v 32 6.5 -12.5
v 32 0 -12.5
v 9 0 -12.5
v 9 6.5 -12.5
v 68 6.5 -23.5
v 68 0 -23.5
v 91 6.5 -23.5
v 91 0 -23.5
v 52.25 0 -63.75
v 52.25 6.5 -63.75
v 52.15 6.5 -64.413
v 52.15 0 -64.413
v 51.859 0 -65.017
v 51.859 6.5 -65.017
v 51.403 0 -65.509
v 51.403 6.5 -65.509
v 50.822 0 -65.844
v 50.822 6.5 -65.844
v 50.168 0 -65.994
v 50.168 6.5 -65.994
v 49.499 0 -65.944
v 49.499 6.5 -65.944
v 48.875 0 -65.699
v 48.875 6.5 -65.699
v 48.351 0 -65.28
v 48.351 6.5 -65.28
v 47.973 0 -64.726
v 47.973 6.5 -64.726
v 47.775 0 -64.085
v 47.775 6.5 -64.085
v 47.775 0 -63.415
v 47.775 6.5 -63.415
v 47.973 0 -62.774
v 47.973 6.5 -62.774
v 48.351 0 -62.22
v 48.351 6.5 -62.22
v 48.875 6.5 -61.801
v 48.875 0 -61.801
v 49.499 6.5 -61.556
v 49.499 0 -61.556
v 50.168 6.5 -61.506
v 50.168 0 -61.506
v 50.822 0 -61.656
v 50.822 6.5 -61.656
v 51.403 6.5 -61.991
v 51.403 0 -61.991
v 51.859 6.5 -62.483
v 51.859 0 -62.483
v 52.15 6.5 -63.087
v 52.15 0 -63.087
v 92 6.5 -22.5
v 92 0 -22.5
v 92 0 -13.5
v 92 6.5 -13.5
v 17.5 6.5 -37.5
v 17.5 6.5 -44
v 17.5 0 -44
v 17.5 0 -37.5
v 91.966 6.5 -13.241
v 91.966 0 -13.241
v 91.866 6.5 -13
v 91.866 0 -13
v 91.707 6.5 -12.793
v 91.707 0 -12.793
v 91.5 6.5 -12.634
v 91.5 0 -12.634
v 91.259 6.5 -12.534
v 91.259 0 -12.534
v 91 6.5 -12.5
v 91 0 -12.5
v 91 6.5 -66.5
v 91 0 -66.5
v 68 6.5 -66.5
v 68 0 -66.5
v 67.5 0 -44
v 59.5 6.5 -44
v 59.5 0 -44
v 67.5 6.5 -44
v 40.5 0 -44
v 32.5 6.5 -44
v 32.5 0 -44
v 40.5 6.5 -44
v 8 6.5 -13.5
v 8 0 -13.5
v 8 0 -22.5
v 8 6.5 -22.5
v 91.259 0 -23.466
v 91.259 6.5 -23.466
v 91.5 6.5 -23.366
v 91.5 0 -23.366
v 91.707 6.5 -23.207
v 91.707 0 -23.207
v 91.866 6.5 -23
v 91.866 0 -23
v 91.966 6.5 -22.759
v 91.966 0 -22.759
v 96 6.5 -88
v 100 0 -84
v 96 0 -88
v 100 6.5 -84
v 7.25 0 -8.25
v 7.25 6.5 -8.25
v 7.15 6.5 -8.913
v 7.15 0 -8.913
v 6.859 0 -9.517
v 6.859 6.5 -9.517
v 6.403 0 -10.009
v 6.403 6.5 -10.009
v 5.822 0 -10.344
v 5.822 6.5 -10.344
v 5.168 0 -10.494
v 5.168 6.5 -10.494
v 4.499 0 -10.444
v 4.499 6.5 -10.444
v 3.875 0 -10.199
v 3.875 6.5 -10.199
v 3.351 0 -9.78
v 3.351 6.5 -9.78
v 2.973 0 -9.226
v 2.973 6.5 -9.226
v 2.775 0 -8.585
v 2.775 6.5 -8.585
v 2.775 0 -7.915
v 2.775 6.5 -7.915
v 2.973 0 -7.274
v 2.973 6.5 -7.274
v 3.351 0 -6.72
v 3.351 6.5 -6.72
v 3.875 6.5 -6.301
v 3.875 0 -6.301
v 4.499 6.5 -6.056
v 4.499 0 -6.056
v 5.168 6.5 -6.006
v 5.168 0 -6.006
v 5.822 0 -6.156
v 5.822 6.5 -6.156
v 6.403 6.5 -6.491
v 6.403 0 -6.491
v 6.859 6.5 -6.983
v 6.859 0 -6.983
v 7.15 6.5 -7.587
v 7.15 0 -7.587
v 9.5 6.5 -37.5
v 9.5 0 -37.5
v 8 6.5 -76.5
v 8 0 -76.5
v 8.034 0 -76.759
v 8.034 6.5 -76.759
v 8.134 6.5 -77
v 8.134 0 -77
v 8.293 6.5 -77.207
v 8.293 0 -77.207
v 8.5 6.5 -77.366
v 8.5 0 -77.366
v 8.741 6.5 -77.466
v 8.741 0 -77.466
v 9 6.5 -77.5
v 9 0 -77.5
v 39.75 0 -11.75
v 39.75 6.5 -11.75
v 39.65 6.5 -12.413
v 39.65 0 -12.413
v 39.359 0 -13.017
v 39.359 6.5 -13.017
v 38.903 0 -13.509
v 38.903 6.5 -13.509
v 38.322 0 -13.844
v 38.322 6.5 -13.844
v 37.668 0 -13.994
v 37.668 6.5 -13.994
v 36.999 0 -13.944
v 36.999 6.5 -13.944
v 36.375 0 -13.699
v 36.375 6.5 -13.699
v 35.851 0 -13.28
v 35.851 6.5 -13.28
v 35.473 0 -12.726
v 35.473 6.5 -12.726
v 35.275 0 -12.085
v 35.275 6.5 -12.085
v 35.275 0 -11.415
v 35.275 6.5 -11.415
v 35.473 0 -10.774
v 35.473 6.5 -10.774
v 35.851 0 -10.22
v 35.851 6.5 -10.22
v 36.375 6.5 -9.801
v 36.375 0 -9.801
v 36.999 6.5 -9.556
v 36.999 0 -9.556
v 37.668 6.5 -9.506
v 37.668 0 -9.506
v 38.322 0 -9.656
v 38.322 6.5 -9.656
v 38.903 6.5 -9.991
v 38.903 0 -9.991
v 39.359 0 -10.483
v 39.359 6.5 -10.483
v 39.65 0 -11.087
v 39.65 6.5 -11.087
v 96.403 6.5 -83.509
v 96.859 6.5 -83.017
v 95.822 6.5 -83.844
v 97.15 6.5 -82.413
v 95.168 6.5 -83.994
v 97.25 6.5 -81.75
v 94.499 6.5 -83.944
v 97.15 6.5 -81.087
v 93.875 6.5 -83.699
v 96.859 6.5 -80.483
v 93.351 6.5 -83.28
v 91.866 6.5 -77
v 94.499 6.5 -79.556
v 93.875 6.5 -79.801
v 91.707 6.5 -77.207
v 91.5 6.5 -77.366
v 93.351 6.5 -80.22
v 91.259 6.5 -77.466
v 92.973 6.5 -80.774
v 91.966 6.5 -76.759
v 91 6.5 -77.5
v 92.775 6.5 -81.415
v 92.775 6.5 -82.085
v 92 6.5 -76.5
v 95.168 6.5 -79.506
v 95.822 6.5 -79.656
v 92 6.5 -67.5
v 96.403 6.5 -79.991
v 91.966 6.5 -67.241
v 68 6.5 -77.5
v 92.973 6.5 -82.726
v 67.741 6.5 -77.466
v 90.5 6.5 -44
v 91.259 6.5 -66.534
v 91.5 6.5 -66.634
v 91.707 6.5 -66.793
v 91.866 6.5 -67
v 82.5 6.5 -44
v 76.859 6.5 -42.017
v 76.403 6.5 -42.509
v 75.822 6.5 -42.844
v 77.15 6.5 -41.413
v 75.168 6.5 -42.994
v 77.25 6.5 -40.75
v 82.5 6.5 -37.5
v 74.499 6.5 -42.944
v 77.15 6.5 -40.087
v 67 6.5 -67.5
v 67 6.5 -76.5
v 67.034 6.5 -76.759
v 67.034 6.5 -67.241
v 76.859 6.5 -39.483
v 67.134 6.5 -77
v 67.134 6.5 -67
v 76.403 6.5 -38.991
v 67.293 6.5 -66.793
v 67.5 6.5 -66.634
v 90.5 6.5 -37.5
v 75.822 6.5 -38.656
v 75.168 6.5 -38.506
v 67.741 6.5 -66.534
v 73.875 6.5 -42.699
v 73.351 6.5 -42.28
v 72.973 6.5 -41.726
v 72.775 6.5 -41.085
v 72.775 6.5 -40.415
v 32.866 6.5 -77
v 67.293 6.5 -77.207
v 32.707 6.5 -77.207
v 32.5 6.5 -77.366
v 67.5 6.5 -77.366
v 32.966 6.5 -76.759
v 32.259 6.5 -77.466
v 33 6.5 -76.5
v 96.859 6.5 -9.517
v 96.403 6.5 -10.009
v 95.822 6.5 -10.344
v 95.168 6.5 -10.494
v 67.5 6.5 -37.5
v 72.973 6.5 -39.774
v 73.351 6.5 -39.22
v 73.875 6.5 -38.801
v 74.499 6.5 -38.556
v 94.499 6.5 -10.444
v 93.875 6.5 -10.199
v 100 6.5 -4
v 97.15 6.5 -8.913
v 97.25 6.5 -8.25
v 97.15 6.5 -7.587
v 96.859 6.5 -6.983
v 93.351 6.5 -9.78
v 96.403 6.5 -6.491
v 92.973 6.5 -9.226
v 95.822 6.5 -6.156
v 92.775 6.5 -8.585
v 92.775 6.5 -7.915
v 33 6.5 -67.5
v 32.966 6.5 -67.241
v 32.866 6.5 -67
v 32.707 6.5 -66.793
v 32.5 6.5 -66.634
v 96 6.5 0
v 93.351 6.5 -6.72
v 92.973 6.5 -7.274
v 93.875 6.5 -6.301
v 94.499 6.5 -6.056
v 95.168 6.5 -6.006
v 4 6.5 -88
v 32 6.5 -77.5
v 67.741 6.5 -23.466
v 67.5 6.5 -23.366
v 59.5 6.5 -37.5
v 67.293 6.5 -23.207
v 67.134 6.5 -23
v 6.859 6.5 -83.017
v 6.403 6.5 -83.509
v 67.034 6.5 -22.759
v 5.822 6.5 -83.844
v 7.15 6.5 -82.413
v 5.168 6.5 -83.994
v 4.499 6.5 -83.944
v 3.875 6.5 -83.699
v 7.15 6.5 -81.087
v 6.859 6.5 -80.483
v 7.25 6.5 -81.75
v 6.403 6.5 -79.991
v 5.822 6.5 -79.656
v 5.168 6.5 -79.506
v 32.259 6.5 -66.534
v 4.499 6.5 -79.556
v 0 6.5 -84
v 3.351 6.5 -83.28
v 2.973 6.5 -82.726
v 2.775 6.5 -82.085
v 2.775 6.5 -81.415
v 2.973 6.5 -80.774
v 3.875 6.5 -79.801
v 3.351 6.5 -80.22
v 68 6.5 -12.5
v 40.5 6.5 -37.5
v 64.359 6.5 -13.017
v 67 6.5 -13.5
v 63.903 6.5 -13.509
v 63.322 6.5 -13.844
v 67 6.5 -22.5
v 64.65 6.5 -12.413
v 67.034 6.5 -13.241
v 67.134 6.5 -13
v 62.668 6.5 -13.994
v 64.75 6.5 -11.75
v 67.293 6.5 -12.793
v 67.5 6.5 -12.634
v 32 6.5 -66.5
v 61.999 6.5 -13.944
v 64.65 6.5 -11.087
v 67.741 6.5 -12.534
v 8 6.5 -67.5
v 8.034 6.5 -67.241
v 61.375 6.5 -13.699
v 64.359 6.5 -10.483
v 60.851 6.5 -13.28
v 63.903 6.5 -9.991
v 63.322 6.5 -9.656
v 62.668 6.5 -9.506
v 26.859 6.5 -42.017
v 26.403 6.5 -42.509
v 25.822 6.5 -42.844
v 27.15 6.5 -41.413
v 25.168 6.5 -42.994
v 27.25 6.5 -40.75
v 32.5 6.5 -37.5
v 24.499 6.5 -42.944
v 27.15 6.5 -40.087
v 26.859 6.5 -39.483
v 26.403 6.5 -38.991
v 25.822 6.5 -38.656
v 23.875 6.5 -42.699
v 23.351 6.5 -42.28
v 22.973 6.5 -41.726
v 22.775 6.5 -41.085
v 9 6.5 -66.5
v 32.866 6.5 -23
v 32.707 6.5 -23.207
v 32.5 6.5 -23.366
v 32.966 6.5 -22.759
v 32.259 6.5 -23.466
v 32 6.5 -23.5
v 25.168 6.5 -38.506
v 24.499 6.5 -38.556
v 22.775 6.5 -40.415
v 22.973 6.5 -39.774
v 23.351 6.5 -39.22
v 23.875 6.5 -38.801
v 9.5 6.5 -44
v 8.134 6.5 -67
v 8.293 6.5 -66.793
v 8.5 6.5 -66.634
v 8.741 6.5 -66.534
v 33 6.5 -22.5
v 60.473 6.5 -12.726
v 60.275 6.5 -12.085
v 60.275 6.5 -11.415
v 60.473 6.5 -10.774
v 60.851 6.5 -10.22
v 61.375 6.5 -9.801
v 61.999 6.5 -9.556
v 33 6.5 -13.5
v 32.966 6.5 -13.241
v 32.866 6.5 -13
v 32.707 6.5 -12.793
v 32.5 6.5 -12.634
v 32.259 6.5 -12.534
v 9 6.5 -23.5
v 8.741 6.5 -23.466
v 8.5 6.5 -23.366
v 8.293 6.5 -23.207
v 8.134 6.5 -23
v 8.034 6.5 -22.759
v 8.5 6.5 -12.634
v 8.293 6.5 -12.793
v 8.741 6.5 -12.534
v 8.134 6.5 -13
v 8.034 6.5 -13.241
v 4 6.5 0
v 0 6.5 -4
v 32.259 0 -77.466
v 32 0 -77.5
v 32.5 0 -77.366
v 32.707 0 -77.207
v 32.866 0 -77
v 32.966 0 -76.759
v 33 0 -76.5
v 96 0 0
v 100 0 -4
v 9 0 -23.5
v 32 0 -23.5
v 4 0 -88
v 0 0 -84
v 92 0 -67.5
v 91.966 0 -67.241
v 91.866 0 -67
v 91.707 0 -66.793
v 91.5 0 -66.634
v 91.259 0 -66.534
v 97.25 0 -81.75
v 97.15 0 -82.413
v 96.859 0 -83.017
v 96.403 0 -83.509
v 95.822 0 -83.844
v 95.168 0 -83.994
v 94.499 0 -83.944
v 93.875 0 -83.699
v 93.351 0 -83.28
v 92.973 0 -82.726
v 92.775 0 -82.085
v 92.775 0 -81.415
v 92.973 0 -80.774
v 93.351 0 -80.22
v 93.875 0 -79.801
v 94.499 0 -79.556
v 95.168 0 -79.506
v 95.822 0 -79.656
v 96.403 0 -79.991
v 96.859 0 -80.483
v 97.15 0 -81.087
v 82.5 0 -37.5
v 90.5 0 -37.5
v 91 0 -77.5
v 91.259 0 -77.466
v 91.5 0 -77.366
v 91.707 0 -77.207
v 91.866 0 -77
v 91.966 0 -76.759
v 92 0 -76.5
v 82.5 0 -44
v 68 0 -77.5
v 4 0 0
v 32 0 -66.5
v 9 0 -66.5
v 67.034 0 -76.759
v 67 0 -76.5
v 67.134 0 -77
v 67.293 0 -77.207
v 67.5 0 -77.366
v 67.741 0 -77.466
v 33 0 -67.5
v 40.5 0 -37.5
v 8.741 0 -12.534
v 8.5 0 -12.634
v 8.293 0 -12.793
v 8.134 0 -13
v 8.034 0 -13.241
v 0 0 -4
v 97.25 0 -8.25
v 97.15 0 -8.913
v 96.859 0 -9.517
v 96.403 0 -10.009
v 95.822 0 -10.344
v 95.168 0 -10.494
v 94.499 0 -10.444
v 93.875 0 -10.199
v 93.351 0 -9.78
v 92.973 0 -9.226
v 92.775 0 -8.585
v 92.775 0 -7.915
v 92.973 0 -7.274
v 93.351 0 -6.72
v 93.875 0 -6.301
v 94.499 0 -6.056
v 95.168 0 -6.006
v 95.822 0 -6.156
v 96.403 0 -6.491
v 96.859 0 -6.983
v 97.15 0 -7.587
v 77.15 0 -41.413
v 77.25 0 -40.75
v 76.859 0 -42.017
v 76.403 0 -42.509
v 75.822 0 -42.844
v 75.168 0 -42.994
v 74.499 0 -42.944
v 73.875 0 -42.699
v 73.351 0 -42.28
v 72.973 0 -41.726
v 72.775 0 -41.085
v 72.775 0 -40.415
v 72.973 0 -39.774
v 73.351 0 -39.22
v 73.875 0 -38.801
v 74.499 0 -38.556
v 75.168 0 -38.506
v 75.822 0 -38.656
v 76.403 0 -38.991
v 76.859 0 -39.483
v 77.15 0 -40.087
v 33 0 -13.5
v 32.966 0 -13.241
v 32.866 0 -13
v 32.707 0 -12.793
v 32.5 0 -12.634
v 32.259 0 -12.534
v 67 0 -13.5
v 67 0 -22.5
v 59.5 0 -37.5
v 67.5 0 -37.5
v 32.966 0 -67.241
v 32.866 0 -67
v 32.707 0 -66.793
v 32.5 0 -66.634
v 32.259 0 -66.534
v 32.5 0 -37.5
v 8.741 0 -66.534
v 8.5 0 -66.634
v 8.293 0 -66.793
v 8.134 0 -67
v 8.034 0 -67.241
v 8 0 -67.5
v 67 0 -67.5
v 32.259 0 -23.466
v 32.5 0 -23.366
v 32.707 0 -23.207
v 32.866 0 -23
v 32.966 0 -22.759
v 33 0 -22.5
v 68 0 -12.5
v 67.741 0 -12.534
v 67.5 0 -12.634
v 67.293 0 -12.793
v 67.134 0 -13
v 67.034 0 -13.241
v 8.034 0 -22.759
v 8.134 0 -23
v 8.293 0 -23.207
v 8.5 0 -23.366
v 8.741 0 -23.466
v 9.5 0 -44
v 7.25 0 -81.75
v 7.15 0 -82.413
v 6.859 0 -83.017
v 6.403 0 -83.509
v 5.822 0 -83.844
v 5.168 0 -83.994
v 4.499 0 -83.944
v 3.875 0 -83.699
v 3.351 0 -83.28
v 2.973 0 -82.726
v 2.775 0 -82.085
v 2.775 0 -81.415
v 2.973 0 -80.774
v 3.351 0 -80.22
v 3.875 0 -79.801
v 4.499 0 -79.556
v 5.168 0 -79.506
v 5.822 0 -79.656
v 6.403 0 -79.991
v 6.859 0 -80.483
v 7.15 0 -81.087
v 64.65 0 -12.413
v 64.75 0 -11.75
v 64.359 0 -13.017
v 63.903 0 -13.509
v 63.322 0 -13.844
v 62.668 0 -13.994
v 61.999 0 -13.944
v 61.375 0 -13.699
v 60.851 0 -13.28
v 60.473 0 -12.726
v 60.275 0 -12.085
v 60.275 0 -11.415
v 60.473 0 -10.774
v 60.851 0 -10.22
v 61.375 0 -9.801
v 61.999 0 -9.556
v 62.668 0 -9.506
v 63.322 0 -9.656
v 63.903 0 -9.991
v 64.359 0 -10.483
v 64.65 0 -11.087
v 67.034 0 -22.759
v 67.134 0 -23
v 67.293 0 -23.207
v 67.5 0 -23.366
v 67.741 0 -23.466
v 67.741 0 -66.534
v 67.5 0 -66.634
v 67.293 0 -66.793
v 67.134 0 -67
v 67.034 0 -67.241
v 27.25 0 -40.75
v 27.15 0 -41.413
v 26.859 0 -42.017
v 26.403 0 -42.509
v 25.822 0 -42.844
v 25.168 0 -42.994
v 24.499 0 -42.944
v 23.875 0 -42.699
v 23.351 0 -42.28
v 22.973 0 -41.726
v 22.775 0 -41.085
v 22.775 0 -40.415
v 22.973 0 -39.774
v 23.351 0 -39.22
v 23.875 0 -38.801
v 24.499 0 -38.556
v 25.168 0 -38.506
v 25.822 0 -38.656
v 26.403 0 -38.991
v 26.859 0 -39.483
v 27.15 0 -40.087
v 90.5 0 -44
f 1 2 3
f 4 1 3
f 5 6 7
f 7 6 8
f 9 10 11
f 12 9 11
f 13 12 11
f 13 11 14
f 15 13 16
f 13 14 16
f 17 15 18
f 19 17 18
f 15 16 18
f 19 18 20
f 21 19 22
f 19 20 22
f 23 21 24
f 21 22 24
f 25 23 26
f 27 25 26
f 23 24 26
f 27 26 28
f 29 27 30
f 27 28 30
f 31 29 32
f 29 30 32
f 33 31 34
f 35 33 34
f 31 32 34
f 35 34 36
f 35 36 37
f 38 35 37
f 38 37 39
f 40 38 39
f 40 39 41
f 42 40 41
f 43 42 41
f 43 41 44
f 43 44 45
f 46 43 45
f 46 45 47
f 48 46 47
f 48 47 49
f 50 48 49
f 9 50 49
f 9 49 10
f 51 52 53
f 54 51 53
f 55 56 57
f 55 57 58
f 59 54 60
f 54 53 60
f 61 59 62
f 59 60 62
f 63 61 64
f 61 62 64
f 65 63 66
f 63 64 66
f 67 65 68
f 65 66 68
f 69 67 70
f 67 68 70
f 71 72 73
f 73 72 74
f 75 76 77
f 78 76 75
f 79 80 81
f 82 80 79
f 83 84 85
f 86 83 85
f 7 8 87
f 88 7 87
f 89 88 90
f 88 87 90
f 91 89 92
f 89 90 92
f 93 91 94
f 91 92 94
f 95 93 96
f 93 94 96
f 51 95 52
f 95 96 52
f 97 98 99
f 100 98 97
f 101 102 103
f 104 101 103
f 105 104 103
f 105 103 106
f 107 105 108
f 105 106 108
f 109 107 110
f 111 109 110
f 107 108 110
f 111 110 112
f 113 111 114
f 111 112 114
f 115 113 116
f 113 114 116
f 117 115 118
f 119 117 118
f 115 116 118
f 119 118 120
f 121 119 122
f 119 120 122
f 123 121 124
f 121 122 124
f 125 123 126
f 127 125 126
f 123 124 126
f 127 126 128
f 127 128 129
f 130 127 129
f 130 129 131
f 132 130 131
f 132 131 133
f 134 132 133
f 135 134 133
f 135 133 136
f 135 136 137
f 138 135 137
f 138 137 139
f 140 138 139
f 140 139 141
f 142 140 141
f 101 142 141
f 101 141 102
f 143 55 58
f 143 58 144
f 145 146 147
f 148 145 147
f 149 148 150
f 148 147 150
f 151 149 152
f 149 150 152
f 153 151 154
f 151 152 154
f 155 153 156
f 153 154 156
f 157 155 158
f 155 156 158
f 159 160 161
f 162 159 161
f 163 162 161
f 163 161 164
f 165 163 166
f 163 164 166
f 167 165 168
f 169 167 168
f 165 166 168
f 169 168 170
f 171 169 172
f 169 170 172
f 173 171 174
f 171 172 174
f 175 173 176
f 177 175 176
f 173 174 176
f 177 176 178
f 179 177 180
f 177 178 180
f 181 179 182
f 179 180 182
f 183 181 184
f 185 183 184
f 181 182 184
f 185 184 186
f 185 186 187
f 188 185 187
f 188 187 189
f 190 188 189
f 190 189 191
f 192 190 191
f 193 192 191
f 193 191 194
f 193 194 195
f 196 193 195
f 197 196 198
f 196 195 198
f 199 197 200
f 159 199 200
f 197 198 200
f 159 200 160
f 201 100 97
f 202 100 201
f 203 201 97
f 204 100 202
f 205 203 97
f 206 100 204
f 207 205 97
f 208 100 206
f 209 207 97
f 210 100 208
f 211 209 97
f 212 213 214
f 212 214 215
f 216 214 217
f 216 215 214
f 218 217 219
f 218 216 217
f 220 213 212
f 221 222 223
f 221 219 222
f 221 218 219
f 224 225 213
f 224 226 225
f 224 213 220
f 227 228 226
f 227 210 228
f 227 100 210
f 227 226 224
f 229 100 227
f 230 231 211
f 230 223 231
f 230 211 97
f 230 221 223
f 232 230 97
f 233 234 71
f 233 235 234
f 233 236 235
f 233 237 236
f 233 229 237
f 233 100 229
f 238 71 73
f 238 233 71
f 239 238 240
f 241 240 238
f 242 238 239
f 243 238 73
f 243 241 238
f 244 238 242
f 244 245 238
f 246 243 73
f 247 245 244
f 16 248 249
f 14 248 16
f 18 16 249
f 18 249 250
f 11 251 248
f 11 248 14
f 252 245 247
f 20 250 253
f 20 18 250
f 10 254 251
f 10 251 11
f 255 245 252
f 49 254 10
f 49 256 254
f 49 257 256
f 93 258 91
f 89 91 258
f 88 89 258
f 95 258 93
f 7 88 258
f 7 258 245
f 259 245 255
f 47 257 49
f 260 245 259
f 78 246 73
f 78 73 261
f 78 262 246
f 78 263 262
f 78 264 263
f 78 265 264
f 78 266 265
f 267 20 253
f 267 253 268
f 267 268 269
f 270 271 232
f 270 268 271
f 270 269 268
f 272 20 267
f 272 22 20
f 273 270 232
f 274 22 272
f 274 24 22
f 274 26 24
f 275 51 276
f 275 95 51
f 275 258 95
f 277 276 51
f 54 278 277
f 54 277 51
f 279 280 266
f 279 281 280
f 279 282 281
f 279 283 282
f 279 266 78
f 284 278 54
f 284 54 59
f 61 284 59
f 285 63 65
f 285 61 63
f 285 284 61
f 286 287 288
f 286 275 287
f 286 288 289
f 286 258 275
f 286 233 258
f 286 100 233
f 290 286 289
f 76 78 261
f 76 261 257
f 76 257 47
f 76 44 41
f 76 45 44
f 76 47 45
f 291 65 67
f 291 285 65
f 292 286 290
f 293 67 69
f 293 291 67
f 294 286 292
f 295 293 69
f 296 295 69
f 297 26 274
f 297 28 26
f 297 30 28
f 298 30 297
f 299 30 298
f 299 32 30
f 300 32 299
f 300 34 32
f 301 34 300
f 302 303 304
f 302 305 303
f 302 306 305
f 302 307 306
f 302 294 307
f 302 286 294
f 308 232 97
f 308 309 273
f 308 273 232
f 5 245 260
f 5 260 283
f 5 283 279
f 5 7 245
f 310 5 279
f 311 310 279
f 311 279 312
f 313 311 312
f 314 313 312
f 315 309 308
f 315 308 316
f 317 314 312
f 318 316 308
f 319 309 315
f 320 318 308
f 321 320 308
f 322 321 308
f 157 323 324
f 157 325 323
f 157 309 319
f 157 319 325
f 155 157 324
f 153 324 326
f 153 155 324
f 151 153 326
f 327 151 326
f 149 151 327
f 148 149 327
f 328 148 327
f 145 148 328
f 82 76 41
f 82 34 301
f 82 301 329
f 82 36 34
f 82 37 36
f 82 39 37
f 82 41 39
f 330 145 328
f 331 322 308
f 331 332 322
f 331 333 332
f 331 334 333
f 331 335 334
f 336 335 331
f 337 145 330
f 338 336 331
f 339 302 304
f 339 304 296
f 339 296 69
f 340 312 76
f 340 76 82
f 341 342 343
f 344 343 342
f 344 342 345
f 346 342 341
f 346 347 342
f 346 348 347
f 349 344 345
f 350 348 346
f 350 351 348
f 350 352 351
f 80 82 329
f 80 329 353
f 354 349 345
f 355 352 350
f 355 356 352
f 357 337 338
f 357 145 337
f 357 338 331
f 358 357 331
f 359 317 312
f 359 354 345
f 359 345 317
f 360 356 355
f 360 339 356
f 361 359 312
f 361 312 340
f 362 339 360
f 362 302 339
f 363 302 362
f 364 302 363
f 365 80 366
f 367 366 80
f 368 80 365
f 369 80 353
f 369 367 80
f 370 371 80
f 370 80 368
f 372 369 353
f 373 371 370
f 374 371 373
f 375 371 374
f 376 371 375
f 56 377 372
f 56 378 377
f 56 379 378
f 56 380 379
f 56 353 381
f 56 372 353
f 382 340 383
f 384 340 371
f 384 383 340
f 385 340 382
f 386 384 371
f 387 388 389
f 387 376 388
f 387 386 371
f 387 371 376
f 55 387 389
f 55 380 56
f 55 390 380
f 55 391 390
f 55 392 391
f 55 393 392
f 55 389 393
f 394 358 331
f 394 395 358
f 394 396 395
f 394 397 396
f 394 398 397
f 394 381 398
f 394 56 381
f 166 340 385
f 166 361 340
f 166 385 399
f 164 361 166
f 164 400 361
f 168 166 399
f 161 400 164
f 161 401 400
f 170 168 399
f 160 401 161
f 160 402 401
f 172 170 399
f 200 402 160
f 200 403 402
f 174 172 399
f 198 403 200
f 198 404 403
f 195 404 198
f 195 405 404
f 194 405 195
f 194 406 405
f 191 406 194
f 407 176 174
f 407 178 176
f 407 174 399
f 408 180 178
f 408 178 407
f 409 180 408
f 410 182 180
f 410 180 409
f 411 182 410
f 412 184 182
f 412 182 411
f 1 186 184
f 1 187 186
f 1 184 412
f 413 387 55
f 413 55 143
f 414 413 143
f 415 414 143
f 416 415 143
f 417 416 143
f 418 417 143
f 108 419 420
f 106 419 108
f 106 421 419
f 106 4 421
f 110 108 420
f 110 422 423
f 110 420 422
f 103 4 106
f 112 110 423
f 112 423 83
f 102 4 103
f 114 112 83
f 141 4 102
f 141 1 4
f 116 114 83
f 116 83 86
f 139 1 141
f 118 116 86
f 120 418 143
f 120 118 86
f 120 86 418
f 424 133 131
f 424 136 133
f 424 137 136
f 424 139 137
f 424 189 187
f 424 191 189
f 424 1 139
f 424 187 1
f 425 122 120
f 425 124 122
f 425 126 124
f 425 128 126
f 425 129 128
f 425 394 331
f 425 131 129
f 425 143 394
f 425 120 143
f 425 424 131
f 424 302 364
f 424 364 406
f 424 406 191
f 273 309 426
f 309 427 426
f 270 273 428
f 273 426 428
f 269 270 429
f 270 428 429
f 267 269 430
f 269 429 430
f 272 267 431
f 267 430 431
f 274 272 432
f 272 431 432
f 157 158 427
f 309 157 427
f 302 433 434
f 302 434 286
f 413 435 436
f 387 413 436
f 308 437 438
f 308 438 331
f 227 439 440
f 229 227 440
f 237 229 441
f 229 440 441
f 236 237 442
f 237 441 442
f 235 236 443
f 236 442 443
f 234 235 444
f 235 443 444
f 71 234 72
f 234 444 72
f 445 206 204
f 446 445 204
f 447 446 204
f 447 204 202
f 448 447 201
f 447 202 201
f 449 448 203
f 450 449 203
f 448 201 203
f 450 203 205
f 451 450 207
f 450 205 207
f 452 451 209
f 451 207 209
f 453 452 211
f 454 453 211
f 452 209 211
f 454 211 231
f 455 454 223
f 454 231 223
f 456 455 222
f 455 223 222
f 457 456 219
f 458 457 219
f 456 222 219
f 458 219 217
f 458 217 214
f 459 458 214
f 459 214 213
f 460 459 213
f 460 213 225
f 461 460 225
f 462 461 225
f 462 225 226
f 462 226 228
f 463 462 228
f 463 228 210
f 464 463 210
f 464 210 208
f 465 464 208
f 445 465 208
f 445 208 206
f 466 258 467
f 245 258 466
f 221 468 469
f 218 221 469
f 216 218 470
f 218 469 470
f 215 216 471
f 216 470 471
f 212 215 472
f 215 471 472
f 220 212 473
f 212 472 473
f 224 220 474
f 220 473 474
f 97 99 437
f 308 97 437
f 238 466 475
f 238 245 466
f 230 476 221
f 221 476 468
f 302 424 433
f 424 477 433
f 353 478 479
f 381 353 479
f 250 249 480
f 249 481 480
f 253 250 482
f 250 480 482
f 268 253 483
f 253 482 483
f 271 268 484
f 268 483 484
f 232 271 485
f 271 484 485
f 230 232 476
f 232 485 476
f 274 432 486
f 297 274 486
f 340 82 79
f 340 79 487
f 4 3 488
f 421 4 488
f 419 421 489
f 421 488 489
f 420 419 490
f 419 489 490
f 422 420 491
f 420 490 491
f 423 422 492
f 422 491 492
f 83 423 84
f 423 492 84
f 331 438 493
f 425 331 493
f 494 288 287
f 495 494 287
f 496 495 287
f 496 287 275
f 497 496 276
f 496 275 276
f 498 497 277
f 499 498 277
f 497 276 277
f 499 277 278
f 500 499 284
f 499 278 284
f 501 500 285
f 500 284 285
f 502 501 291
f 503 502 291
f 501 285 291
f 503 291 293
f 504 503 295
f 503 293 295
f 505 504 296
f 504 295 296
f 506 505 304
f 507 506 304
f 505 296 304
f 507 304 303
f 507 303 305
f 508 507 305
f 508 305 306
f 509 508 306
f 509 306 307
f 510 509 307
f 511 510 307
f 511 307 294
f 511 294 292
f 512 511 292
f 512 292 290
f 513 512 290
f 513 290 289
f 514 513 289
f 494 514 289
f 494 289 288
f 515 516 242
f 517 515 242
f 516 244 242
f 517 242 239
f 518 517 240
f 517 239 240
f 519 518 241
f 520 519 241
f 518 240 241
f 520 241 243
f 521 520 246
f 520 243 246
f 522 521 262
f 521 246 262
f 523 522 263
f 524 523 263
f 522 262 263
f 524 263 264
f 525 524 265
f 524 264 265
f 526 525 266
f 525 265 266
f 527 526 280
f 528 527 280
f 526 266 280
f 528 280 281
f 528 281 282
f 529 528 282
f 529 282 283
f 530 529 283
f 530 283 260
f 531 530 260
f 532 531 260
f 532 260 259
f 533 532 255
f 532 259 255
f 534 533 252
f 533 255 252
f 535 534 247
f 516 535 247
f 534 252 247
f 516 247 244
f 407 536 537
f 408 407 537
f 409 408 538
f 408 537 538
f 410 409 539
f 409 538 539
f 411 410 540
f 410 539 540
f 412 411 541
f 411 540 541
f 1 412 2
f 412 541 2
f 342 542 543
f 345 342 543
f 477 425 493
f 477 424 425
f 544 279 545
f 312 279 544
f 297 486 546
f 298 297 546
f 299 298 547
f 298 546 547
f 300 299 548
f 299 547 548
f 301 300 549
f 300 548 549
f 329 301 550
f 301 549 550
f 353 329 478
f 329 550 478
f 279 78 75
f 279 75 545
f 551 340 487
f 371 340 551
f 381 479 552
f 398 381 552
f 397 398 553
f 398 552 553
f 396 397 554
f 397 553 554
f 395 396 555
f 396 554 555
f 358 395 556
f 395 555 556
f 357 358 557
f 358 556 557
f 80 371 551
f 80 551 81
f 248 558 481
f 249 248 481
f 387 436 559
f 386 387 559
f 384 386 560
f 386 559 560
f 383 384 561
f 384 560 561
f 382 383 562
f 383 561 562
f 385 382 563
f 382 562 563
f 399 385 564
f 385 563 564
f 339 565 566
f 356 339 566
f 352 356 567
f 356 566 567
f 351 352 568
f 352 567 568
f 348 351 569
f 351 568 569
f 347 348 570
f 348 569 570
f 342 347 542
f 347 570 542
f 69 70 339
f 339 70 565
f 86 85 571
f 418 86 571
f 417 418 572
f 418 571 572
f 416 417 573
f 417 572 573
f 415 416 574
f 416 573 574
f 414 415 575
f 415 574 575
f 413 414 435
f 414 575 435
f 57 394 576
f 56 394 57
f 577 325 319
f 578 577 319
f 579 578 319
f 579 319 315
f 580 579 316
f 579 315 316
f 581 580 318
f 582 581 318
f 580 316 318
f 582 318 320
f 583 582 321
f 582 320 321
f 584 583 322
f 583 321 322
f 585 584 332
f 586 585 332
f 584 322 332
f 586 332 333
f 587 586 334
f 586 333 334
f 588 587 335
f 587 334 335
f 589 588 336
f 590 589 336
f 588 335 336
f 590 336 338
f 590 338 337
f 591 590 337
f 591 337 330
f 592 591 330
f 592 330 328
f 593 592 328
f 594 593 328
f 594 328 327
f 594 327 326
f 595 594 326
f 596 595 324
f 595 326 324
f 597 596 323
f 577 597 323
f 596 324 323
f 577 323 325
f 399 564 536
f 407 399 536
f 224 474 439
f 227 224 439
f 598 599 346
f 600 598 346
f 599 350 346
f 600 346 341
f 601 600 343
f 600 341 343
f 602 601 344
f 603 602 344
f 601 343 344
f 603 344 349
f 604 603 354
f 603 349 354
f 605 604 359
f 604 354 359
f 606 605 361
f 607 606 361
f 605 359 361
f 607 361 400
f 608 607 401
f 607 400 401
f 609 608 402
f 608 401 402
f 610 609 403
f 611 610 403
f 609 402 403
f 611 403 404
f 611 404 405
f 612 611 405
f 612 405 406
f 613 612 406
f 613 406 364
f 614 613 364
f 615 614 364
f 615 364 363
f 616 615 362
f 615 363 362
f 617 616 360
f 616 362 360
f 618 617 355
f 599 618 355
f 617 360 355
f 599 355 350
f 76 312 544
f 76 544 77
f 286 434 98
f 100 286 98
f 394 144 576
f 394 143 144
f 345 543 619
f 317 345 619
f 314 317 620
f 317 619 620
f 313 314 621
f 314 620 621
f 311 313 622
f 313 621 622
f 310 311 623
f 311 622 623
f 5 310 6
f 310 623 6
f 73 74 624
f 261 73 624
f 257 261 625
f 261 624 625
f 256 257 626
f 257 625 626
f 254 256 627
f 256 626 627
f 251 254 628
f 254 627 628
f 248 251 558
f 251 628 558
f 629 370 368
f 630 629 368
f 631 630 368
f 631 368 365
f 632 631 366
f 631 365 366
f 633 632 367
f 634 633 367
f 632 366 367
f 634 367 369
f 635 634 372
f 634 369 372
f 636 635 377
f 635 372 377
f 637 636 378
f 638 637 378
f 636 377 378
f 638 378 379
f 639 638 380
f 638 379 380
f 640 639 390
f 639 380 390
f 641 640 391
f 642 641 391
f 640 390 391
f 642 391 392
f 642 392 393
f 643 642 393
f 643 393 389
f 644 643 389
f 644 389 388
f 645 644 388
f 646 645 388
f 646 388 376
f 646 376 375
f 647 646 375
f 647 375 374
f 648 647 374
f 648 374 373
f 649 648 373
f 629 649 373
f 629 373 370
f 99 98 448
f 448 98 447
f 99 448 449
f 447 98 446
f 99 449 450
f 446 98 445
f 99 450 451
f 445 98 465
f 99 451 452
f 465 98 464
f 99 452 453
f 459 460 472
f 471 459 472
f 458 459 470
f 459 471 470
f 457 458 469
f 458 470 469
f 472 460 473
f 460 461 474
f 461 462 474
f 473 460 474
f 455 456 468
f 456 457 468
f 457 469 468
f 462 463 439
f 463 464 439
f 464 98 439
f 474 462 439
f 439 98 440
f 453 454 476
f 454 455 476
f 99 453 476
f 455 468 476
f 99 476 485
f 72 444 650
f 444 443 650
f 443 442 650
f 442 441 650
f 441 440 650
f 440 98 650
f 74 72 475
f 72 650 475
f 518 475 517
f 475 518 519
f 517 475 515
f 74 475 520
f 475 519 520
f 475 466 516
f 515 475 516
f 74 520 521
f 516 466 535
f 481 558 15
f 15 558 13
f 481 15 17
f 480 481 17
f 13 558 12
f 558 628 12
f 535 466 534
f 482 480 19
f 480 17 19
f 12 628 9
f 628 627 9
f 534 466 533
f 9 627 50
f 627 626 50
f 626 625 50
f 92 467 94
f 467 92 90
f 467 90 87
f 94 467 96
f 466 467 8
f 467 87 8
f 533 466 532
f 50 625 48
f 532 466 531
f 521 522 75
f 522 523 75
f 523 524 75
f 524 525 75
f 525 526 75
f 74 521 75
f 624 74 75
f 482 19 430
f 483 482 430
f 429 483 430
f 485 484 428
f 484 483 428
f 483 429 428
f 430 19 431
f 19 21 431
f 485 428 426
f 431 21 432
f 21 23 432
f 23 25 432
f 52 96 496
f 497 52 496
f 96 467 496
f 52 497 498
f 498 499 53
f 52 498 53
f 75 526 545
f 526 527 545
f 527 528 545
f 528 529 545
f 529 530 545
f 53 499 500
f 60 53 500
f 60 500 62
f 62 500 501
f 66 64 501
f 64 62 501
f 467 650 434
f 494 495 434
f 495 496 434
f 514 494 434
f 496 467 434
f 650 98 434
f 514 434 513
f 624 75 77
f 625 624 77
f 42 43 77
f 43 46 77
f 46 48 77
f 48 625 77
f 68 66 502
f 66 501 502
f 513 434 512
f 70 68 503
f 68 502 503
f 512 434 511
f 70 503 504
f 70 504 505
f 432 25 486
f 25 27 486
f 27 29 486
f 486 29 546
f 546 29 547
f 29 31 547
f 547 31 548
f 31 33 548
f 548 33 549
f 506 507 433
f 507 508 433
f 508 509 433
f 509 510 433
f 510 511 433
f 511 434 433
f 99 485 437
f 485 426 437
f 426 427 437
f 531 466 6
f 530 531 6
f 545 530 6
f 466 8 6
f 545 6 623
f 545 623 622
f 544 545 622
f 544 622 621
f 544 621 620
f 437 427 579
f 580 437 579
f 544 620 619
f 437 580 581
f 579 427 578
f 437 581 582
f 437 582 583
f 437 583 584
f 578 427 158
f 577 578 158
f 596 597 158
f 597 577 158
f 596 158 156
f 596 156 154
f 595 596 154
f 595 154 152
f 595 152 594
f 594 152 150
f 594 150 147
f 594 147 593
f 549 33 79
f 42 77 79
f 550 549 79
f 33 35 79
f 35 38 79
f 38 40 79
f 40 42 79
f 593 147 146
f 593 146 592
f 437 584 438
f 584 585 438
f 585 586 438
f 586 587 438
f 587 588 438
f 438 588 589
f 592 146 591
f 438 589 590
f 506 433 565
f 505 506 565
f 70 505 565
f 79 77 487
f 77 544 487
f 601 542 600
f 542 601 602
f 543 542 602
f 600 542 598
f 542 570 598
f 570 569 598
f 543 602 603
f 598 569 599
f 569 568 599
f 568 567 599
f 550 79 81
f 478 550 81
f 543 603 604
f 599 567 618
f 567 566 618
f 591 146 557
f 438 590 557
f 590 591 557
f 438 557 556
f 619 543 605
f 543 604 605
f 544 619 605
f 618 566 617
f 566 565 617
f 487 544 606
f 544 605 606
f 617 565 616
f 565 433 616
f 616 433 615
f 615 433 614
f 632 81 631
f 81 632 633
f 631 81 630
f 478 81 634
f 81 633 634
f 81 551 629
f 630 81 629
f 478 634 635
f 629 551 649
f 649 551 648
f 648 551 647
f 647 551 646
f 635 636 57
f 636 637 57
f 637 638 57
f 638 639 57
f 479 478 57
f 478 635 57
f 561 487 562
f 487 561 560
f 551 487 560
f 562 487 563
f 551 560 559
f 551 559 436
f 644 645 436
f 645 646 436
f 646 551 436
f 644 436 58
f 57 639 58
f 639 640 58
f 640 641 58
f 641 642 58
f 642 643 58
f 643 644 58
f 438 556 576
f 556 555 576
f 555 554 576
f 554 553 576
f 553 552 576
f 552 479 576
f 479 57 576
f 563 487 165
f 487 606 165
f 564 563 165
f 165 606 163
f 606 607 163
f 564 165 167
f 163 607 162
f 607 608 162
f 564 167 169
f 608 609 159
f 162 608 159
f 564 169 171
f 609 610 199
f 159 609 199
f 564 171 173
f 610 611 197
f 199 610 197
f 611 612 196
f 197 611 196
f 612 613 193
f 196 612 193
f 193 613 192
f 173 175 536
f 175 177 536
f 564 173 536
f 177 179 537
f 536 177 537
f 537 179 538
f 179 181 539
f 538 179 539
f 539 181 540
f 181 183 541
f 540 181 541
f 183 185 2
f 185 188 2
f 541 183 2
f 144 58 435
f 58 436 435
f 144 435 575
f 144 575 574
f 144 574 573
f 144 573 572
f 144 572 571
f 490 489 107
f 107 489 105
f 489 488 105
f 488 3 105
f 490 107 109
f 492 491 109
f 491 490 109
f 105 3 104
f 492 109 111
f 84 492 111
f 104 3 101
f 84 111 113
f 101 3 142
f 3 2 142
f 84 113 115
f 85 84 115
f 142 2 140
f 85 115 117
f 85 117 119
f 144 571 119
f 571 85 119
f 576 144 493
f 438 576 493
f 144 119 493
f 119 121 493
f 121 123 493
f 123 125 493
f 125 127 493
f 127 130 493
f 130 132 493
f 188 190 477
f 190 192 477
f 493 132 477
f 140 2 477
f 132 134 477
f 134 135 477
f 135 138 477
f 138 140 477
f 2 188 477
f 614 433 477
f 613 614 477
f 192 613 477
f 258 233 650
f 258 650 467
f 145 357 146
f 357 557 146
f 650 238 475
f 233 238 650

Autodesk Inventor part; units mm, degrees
ref_plane "YZ Plane" through (0, 0, 0) normal (1, 0, 0) x (0, 1, 0)
ref_plane "XZ Plane" through (0, 0, 0) normal (0, 1, 0) x (-1, 0, 0)
ref_plane "XY Plane" through (0, 0, 0) normal (0, 0, 1) x (1, 0, 0)
sketch "Sketch1" plane through (0, 0, 0) normal (0, 1, 0) x (-1, 0, 0)
  line L0 (0, 0) -> (-100, 0)
  line L1 (-100, 0) -> (-100, -88)
  line L2 (-100, -88) -> (0, -88)
  line L3 (0, -88) -> (0, 0)
  line L4 (-9, -23.5) -> (-32, -23.5)
  line L5 (-33, -22.5) -> (-33, -13.5)
  line L6 (-32, -12.5) -> (-9, -12.5)
  line L7 (-8, -13.5) -> (-8, -22.5)
  arc A0 (-9, -23.5) -> (-8, -22.5) centre (-9, -22.5) ccw
  arc A1 (-8, -13.5) -> (-9, -12.5) centre (-9, -13.5) ccw
  arc A2 (-32, -12.5) -> (-33, -13.5) centre (-32, -13.5) ccw
  arc A3 (-33, -22.5) -> (-32, -23.5) centre (-32, -22.5) ccw
  line L8 (-9, -77.5) -> (-32, -77.5)
  line L9 (-33, -76.5) -> (-33, -67.5)
  line L10 (-32, -66.5) -> (-9, -66.5)
  line L11 (-8, -67.5) -> (-8, -76.5)
  arc A4 (-9, -77.5) -> (-8, -76.5) centre (-9, -76.5) ccw
  arc A5 (-8, -67.5) -> (-9, -66.5) centre (-9, -67.5) ccw
  arc A6 (-32, -66.5) -> (-33, -67.5) centre (-32, -67.5) ccw
  arc A7 (-33, -76.5) -> (-32, -77.5) centre (-32, -76.5) ccw
  line L12 (-68, -77.5) -> (-91, -77.5)
  line L13 (-92, -76.5) -> (-92, -67.5)
  line L14 (-91, -66.5) -> (-68, -66.5)
  line L15 (-67, -67.5) -> (-67, -76.5)
  arc A8 (-68, -77.5) -> (-67, -76.5) centre (-68, -76.5) ccw
  arc A9 (-67, -67.5) -> (-68, -66.5) centre (-68, -67.5) ccw
  arc A10 (-91, -66.5) -> (-92, -67.5) centre (-91, -67.5) ccw
  arc A11 (-92, -76.5) -> (-91, -77.5) centre (-91, -76.5) ccw
  line L16 (-68, -23.5) -> (-91, -23.5)
  line L17 (-92, -22.5) -> (-92, -13.5)
  line L18 (-91, -12.5) -> (-68, -12.5)
  line L19 (-67, -13.5) -> (-67, -22.5)
  arc A12 (-68, -23.5) -> (-67, -22.5) centre (-68, -22.5) ccw
  arc A13 (-67, -13.5) -> (-68, -12.5) centre (-68, -13.5) ccw
  arc A14 (-91, -12.5) -> (-92, -13.5) centre (-91, -13.5) ccw
  arc A15 (-92, -22.5) -> (-91, -23.5) centre (-91, -22.5) ccw
  line L20 (-8, -72) -> (-92, -72) construction
  line L21 (-92, -18) -> (-8, -18) construction
  point P0 (-50, -18)
  point P1 (-50, 0)
  dimension "d0" = 100
  dimension "d1" = 88
  dimension "d2" = 1
  dimension "d3" = 25
  dimension "d4" = 11
  dimension "d5" = 1
  dimension "d6" = 25
  dimension "d7" = 11
  dimension "d8" = 1
  dimension "d9" = 25
  dimension "d10" = 11
  dimension "d11" = 1
  dimension "d12" = 25
  dimension "d13" = 11
  dimension "d14" = 54
  dimension "d15" = 18
  dimension "d16" = 8
extrude "Extrusion1" add sketch "Sketch1" along normal blind 6.5
chamfer "Chamfer1" distance 4 angle 45 4 edges at (0, 3.25, 0) (100, 3.25, 0) (100, 3.25, -88) (0, 3.25, -88)
sketch "Sketch2" plane through (0, 6.5, 0) normal (0, 1, 0) x (1, 0, 0)
  line L0 (4, 0) -> (96, 0) projected
  line L1 (9.5, 44) -> (17.5, 44)
  line L2 (17.5, 44) -> (17.5, 37.5)
  line L3 (17.5, 37.5) -> (9.5, 37.5)
  line L4 (9.5, 37.5) -> (9.5, 44)
  line L5 (32.5, 44) -> (40.5, 44)
  line L6 (40.5, 44) -> (40.5, 37.5)
  line L7 (40.5, 37.5) -> (32.5, 37.5)
  line L8 (32.5, 37.5) -> (32.5, 44)
  line L9 (59.5, 44) -> (67.5, 44)
  line L10 (67.5, 44) -> (67.5, 37.5)
  line L11 (67.5, 37.5) -> (59.5, 37.5)
  line L12 (59.5, 37.5) -> (59.5, 44)
  line L13 (82.5, 44) -> (90.5, 44)
  line L14 (90.5, 44) -> (90.5, 37.5)
  line L15 (90.5, 37.5) -> (82.5, 37.5)
  line L16 (82.5, 37.5) -> (82.5, 44)
  line L17 (17.5, 44) -> (32.5, 37.5) construction
  line L18 (32.5, 44) -> (17.5, 37.5) construction
  line L19 (67.5, 37.5) -> (82.5, 44) construction
  line L20 (82.5, 37.5) -> (67.5, 44) construction
  circle A0 centre (25, 40.75) radius 2.25
  circle A1 centre (75, 40.75) radius 2.25
  line L21 (40.5, 40.75) -> (59.5, 40.75) construction
  point P0 (0, 0)
  point P1 (50, 40.75)
  point P2 (50, 0)
  dimension "d22" = 6.5
  dimension "d23" = 8
  dimension "d24" = 15
  dimension "d25" = 15
  dimension "d26" = 4.5
  dimension "d27" = 4.5
  dimension "d28" = 50
  dimension "d29" = 37.5
extrude "Extrusion2" cut sketch "Sketch2" against normal through all
sketch "Sketch3" plane through (0, 6.5, 0) normal (0, 1, 0) x (1, 0, 0)
  line L0 (9, 77.5) -> (32, 77.5) projected
  line L1 (8, 67.5) -> (8, 76.5) projected
  line L2 (32, 12.5) -> (9, 12.5) projected
  line L3 (0, 84) -> (0, 4) projected
  line L4 (4, 0) -> (96, 0) projected
  line L5 (100, 4) -> (100, 84) projected
  line L6 (5, 81.75) -> (95, 81.75) construction
  line L7 (95, 81.75) -> (95, 8.25) construction
  line L8 (95, 8.25) -> (5, 8.25) construction
  line L9 (5, 8.25) -> (5, 81.75) construction
  circle A0 centre (5, 81.75) radius 4.5 construction
  circle A1 centre (95, 81.75) radius 4.5 construction
  circle A2 centre (95, 8.25) radius 4.5 construction
  circle A3 centre (5, 8.25) radius 4.5 construction
  circle A4 centre (5, 81.75) radius 2.25
  circle A5 centre (95, 81.75) radius 2.25
  circle A6 centre (95, 8.25) radius 2.25
  circle A7 centre (5, 8.25) radius 2.25
  point P0 (0, 0)
  dimension "d32" = 9
  dimension "d33" = 4.5
  dimension "d34" = 8
  dimension "d35" = 12.5
  dimension "d36" = 5
  dimension "d37" = 5
  dimension "d38" = 8.25
  dimension "d39" = 4.25
extrude "Extrusion3" cut sketch "Sketch3" against normal through all
sketch "Sketch4" plane through (0, 6.5, 0) normal (0, 1, 0) x (1, 0, 0)
  line L0 (4, 0) -> (96, 0) projected
  line L1 (96, 88) -> (4, 88) projected
  circle A0 centre (37.5, 11.75) radius 2.25
  circle A1 centre (62.5, 11.75) radius 2.25
  line L2 (37.5, 11.75) -> (62.5, 11.75) construction
  point P0 (0, 0)
  point P1 (50, 11.75)
  point P2 (50, 0)
  dimension "d42" = 4.5
  dimension "d43" = 25
  dimension "d44" = 11.75
extrude "Extrusion4" cut sketch "Sketch4" against normal through all
sketch "Sketch5" plane through (0, 6.5, 0) normal (0, 1, 0) x (1, 0, 0)
  line L0 (32.5, 44) -> (40.5, 44) projected
  line L1 (96, 88) -> (4, 88) projected
  circle A0 centre (50, 63.75) radius 2.25
  point P0 (0, 0)
  point P1 (50, 88)
  dimension "d47" = 4.5
  dimension "d48" = 19.75
extrude "Extrusion5" cut sketch "Sketch5" against normal through all
equation "\"d25\" = d24"
equation "\"d37\" = d36"
equation "\"d39\" = d35 - d38"
properties part number "x_carryage_back" material "Plywood, Finish"
